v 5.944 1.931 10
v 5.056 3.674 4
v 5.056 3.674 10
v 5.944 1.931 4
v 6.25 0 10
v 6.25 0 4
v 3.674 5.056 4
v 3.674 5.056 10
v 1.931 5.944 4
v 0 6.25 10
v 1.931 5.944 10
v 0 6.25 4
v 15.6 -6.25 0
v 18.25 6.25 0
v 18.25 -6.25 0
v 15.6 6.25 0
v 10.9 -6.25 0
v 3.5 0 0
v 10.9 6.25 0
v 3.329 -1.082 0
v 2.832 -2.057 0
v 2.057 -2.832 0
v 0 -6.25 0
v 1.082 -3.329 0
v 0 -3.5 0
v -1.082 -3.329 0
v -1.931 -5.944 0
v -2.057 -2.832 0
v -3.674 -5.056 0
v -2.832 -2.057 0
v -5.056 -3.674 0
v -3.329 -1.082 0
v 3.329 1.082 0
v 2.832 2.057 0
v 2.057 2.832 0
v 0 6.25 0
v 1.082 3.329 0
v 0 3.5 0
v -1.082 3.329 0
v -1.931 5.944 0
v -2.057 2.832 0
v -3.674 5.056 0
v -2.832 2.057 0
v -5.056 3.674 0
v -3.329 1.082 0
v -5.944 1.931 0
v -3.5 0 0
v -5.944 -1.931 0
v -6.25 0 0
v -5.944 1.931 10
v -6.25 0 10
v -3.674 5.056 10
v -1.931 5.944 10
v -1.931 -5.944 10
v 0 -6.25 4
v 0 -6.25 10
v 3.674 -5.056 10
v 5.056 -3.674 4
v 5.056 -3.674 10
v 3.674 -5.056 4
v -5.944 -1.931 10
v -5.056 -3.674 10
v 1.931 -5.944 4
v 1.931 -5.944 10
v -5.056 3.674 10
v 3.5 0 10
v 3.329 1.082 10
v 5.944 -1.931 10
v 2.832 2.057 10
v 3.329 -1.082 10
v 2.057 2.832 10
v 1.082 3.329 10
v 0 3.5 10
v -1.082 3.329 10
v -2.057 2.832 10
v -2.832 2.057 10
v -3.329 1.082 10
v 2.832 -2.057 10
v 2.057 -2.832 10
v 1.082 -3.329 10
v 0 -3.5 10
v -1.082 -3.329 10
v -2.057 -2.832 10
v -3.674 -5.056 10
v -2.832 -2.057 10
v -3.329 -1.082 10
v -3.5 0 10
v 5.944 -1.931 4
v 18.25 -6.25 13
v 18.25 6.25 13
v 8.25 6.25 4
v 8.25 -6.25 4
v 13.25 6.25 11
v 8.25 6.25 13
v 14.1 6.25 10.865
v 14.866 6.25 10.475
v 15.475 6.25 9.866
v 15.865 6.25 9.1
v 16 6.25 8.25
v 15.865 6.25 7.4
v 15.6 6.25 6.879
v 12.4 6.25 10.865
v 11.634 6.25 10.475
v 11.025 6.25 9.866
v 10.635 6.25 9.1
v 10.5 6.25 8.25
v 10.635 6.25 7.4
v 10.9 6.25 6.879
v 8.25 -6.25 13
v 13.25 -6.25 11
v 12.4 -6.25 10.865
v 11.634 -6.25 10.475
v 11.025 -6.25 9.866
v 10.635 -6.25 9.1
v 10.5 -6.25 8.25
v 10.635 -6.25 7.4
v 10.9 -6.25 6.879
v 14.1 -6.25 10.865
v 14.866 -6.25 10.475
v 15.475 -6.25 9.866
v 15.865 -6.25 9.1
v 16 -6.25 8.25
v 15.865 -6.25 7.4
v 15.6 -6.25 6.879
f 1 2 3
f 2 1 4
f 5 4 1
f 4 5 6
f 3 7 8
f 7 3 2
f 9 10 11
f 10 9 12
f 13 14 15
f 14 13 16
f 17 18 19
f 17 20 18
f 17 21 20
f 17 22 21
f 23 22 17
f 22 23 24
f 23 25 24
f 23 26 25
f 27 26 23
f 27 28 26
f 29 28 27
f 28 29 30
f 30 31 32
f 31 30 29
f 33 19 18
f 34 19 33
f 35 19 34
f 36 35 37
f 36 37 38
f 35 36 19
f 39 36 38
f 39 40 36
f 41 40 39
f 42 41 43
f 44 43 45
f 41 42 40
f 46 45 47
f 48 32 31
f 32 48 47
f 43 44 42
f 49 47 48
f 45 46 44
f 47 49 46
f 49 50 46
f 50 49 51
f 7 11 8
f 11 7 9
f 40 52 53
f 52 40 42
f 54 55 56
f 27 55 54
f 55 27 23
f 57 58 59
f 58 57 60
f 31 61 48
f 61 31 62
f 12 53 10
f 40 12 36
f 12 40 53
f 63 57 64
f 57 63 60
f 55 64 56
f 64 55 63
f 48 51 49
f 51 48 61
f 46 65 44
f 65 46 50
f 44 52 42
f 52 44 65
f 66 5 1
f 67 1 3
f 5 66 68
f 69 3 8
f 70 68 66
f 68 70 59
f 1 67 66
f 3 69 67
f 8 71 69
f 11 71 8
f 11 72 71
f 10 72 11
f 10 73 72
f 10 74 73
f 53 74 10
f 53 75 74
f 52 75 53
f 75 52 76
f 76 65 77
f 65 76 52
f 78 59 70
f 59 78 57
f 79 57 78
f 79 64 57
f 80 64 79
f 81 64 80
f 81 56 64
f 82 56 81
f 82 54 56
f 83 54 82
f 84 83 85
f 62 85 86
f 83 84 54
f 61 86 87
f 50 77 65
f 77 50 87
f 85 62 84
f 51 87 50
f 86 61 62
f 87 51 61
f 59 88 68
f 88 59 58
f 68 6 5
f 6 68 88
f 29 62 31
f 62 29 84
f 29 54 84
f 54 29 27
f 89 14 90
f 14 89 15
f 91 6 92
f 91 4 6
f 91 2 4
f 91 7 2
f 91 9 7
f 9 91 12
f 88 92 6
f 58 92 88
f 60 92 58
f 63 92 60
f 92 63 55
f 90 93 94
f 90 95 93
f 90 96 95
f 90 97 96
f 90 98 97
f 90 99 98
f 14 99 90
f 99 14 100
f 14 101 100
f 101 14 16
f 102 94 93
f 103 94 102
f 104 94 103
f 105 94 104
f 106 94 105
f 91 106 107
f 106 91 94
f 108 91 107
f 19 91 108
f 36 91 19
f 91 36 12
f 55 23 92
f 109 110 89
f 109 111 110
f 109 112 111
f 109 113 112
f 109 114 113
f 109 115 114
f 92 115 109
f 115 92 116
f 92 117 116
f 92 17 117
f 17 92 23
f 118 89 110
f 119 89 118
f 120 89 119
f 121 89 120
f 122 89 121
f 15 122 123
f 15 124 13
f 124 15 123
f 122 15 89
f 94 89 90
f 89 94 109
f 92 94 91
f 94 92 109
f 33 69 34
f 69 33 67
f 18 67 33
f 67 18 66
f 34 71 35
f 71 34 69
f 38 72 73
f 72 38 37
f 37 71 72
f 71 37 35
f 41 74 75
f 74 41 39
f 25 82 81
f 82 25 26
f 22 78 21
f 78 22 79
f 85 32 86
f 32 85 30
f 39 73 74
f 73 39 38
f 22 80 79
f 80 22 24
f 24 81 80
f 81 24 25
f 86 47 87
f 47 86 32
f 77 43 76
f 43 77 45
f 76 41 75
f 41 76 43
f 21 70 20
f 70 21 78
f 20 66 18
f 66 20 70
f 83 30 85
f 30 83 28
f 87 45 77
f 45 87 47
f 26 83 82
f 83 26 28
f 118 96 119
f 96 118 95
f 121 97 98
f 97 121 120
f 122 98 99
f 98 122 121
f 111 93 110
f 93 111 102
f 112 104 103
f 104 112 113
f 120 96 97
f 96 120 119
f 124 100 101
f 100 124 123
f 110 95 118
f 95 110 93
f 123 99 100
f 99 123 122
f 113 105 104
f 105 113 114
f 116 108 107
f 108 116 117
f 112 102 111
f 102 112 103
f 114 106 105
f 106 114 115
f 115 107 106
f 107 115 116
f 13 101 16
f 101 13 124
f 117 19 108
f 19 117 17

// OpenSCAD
/*
 * Shower Caddy Anchor, v1.0
 *
 * by Alex Franke (CodeCreations), Jun 2012
 * http://www.theFrankes.com
 * 
 * Licenced under Creative Commons Attribution - Non-Commercial - Share Alike 3.0 
 * 
 * DESCRIPTION: This is a simple parametric shower caddy anchor that uses a suction
 *   cup from a nerf dart to keep the caddy stable. 
 * 
 * INSTRUCTIONS:  Choose some values in the "User-defined values" section, render,
 *   and print one or more of the shower caddy anchors. (For me, it required about 
 *   285mm of filament -- about 5 cents.) Pull the suction cup(s) off of a Nerf 
 *   suction dart (e.g. http://amzn.com/B00284C4FK -- or you can get them at places 
 *   like Walmart) and clean off any remaining glue. Attach dart head to shower caddy 
 *   anchor. 
 * 
 * v1.0, Jun 17, 2012: Initial Release.
 * 
 * TODO: 
 *   * nothing yet...  
 */

/////////////////////////////////////////////////////////////////////////////
// User-defined values... 
/////////////////////////////////////////////////////////////////////////////

diameter      = 12.5;  // Diameter of the nerf dart
holeDiameter  = 7;     // Diameter of the hole in the nerf dart
height        = 10;    // Height of the suction cup mount
thickness     = 4;     // Thickness of the base that connects the cup to the clip
clipThickness = 10;    // Overall width of the clip 
clipHeight    = 13;    // Overall height of the clip 
gap           = 2	;     // Distance between the clip and the suction cup mount 
wireDiameter  = 5.5;   // Diameter of the caddy wire
gutterWidth   = 4.7;   // Width of the gap used to snap the wire in place. 

$fn           = 20;    // Curve detail 


/////////////////////////////////////////////////////////////////////////////
// Calculated values... 
/////////////////////////////////////////////////////////////////////////////

length = clipThickness + gap + diameter/2; 
gutterHeight = clipHeight-wireDiameter/2 - 2; 


/////////////////////////////////////////////////////////////////////////////
// The code... 
/////////////////////////////////////////////////////////////////////////////

difference() {
	union() {
		// Suction cup mount 
		translate([0,0,height/2]) 
			cylinder( r=diameter/2, h=height, center=true );

		// Base connecting suction cup mount to clip 
		translate([length/2,0,thickness/2]) 
			cube( [length,diameter,thickness], center=true);  

		// Caddy clip 
		translate([length-clipThickness/2,0,clipHeight/2]) 
			cube( [clipThickness,diameter,clipHeight], center=true);  
	}

	// Suction cup mount hole 
	translate([0,0,height/2]) 
		cylinder( r=holeDiameter/2, h=height+1, center=true );

	// Caddy wire hole
	translate([length-clipThickness/2,0,clipHeight-wireDiameter/2 - 2]) 
		rotate([90,0,0]) 
			cylinder( r=wireDiameter/2, h=diameter+1, center=true );

	// Caddy wire gutter 
	translate([length-clipThickness/2,0,(gutterHeight-1)/2]) 
		cube( [gutterWidth, diameter+1, gutterHeight+1], center=true );
}
